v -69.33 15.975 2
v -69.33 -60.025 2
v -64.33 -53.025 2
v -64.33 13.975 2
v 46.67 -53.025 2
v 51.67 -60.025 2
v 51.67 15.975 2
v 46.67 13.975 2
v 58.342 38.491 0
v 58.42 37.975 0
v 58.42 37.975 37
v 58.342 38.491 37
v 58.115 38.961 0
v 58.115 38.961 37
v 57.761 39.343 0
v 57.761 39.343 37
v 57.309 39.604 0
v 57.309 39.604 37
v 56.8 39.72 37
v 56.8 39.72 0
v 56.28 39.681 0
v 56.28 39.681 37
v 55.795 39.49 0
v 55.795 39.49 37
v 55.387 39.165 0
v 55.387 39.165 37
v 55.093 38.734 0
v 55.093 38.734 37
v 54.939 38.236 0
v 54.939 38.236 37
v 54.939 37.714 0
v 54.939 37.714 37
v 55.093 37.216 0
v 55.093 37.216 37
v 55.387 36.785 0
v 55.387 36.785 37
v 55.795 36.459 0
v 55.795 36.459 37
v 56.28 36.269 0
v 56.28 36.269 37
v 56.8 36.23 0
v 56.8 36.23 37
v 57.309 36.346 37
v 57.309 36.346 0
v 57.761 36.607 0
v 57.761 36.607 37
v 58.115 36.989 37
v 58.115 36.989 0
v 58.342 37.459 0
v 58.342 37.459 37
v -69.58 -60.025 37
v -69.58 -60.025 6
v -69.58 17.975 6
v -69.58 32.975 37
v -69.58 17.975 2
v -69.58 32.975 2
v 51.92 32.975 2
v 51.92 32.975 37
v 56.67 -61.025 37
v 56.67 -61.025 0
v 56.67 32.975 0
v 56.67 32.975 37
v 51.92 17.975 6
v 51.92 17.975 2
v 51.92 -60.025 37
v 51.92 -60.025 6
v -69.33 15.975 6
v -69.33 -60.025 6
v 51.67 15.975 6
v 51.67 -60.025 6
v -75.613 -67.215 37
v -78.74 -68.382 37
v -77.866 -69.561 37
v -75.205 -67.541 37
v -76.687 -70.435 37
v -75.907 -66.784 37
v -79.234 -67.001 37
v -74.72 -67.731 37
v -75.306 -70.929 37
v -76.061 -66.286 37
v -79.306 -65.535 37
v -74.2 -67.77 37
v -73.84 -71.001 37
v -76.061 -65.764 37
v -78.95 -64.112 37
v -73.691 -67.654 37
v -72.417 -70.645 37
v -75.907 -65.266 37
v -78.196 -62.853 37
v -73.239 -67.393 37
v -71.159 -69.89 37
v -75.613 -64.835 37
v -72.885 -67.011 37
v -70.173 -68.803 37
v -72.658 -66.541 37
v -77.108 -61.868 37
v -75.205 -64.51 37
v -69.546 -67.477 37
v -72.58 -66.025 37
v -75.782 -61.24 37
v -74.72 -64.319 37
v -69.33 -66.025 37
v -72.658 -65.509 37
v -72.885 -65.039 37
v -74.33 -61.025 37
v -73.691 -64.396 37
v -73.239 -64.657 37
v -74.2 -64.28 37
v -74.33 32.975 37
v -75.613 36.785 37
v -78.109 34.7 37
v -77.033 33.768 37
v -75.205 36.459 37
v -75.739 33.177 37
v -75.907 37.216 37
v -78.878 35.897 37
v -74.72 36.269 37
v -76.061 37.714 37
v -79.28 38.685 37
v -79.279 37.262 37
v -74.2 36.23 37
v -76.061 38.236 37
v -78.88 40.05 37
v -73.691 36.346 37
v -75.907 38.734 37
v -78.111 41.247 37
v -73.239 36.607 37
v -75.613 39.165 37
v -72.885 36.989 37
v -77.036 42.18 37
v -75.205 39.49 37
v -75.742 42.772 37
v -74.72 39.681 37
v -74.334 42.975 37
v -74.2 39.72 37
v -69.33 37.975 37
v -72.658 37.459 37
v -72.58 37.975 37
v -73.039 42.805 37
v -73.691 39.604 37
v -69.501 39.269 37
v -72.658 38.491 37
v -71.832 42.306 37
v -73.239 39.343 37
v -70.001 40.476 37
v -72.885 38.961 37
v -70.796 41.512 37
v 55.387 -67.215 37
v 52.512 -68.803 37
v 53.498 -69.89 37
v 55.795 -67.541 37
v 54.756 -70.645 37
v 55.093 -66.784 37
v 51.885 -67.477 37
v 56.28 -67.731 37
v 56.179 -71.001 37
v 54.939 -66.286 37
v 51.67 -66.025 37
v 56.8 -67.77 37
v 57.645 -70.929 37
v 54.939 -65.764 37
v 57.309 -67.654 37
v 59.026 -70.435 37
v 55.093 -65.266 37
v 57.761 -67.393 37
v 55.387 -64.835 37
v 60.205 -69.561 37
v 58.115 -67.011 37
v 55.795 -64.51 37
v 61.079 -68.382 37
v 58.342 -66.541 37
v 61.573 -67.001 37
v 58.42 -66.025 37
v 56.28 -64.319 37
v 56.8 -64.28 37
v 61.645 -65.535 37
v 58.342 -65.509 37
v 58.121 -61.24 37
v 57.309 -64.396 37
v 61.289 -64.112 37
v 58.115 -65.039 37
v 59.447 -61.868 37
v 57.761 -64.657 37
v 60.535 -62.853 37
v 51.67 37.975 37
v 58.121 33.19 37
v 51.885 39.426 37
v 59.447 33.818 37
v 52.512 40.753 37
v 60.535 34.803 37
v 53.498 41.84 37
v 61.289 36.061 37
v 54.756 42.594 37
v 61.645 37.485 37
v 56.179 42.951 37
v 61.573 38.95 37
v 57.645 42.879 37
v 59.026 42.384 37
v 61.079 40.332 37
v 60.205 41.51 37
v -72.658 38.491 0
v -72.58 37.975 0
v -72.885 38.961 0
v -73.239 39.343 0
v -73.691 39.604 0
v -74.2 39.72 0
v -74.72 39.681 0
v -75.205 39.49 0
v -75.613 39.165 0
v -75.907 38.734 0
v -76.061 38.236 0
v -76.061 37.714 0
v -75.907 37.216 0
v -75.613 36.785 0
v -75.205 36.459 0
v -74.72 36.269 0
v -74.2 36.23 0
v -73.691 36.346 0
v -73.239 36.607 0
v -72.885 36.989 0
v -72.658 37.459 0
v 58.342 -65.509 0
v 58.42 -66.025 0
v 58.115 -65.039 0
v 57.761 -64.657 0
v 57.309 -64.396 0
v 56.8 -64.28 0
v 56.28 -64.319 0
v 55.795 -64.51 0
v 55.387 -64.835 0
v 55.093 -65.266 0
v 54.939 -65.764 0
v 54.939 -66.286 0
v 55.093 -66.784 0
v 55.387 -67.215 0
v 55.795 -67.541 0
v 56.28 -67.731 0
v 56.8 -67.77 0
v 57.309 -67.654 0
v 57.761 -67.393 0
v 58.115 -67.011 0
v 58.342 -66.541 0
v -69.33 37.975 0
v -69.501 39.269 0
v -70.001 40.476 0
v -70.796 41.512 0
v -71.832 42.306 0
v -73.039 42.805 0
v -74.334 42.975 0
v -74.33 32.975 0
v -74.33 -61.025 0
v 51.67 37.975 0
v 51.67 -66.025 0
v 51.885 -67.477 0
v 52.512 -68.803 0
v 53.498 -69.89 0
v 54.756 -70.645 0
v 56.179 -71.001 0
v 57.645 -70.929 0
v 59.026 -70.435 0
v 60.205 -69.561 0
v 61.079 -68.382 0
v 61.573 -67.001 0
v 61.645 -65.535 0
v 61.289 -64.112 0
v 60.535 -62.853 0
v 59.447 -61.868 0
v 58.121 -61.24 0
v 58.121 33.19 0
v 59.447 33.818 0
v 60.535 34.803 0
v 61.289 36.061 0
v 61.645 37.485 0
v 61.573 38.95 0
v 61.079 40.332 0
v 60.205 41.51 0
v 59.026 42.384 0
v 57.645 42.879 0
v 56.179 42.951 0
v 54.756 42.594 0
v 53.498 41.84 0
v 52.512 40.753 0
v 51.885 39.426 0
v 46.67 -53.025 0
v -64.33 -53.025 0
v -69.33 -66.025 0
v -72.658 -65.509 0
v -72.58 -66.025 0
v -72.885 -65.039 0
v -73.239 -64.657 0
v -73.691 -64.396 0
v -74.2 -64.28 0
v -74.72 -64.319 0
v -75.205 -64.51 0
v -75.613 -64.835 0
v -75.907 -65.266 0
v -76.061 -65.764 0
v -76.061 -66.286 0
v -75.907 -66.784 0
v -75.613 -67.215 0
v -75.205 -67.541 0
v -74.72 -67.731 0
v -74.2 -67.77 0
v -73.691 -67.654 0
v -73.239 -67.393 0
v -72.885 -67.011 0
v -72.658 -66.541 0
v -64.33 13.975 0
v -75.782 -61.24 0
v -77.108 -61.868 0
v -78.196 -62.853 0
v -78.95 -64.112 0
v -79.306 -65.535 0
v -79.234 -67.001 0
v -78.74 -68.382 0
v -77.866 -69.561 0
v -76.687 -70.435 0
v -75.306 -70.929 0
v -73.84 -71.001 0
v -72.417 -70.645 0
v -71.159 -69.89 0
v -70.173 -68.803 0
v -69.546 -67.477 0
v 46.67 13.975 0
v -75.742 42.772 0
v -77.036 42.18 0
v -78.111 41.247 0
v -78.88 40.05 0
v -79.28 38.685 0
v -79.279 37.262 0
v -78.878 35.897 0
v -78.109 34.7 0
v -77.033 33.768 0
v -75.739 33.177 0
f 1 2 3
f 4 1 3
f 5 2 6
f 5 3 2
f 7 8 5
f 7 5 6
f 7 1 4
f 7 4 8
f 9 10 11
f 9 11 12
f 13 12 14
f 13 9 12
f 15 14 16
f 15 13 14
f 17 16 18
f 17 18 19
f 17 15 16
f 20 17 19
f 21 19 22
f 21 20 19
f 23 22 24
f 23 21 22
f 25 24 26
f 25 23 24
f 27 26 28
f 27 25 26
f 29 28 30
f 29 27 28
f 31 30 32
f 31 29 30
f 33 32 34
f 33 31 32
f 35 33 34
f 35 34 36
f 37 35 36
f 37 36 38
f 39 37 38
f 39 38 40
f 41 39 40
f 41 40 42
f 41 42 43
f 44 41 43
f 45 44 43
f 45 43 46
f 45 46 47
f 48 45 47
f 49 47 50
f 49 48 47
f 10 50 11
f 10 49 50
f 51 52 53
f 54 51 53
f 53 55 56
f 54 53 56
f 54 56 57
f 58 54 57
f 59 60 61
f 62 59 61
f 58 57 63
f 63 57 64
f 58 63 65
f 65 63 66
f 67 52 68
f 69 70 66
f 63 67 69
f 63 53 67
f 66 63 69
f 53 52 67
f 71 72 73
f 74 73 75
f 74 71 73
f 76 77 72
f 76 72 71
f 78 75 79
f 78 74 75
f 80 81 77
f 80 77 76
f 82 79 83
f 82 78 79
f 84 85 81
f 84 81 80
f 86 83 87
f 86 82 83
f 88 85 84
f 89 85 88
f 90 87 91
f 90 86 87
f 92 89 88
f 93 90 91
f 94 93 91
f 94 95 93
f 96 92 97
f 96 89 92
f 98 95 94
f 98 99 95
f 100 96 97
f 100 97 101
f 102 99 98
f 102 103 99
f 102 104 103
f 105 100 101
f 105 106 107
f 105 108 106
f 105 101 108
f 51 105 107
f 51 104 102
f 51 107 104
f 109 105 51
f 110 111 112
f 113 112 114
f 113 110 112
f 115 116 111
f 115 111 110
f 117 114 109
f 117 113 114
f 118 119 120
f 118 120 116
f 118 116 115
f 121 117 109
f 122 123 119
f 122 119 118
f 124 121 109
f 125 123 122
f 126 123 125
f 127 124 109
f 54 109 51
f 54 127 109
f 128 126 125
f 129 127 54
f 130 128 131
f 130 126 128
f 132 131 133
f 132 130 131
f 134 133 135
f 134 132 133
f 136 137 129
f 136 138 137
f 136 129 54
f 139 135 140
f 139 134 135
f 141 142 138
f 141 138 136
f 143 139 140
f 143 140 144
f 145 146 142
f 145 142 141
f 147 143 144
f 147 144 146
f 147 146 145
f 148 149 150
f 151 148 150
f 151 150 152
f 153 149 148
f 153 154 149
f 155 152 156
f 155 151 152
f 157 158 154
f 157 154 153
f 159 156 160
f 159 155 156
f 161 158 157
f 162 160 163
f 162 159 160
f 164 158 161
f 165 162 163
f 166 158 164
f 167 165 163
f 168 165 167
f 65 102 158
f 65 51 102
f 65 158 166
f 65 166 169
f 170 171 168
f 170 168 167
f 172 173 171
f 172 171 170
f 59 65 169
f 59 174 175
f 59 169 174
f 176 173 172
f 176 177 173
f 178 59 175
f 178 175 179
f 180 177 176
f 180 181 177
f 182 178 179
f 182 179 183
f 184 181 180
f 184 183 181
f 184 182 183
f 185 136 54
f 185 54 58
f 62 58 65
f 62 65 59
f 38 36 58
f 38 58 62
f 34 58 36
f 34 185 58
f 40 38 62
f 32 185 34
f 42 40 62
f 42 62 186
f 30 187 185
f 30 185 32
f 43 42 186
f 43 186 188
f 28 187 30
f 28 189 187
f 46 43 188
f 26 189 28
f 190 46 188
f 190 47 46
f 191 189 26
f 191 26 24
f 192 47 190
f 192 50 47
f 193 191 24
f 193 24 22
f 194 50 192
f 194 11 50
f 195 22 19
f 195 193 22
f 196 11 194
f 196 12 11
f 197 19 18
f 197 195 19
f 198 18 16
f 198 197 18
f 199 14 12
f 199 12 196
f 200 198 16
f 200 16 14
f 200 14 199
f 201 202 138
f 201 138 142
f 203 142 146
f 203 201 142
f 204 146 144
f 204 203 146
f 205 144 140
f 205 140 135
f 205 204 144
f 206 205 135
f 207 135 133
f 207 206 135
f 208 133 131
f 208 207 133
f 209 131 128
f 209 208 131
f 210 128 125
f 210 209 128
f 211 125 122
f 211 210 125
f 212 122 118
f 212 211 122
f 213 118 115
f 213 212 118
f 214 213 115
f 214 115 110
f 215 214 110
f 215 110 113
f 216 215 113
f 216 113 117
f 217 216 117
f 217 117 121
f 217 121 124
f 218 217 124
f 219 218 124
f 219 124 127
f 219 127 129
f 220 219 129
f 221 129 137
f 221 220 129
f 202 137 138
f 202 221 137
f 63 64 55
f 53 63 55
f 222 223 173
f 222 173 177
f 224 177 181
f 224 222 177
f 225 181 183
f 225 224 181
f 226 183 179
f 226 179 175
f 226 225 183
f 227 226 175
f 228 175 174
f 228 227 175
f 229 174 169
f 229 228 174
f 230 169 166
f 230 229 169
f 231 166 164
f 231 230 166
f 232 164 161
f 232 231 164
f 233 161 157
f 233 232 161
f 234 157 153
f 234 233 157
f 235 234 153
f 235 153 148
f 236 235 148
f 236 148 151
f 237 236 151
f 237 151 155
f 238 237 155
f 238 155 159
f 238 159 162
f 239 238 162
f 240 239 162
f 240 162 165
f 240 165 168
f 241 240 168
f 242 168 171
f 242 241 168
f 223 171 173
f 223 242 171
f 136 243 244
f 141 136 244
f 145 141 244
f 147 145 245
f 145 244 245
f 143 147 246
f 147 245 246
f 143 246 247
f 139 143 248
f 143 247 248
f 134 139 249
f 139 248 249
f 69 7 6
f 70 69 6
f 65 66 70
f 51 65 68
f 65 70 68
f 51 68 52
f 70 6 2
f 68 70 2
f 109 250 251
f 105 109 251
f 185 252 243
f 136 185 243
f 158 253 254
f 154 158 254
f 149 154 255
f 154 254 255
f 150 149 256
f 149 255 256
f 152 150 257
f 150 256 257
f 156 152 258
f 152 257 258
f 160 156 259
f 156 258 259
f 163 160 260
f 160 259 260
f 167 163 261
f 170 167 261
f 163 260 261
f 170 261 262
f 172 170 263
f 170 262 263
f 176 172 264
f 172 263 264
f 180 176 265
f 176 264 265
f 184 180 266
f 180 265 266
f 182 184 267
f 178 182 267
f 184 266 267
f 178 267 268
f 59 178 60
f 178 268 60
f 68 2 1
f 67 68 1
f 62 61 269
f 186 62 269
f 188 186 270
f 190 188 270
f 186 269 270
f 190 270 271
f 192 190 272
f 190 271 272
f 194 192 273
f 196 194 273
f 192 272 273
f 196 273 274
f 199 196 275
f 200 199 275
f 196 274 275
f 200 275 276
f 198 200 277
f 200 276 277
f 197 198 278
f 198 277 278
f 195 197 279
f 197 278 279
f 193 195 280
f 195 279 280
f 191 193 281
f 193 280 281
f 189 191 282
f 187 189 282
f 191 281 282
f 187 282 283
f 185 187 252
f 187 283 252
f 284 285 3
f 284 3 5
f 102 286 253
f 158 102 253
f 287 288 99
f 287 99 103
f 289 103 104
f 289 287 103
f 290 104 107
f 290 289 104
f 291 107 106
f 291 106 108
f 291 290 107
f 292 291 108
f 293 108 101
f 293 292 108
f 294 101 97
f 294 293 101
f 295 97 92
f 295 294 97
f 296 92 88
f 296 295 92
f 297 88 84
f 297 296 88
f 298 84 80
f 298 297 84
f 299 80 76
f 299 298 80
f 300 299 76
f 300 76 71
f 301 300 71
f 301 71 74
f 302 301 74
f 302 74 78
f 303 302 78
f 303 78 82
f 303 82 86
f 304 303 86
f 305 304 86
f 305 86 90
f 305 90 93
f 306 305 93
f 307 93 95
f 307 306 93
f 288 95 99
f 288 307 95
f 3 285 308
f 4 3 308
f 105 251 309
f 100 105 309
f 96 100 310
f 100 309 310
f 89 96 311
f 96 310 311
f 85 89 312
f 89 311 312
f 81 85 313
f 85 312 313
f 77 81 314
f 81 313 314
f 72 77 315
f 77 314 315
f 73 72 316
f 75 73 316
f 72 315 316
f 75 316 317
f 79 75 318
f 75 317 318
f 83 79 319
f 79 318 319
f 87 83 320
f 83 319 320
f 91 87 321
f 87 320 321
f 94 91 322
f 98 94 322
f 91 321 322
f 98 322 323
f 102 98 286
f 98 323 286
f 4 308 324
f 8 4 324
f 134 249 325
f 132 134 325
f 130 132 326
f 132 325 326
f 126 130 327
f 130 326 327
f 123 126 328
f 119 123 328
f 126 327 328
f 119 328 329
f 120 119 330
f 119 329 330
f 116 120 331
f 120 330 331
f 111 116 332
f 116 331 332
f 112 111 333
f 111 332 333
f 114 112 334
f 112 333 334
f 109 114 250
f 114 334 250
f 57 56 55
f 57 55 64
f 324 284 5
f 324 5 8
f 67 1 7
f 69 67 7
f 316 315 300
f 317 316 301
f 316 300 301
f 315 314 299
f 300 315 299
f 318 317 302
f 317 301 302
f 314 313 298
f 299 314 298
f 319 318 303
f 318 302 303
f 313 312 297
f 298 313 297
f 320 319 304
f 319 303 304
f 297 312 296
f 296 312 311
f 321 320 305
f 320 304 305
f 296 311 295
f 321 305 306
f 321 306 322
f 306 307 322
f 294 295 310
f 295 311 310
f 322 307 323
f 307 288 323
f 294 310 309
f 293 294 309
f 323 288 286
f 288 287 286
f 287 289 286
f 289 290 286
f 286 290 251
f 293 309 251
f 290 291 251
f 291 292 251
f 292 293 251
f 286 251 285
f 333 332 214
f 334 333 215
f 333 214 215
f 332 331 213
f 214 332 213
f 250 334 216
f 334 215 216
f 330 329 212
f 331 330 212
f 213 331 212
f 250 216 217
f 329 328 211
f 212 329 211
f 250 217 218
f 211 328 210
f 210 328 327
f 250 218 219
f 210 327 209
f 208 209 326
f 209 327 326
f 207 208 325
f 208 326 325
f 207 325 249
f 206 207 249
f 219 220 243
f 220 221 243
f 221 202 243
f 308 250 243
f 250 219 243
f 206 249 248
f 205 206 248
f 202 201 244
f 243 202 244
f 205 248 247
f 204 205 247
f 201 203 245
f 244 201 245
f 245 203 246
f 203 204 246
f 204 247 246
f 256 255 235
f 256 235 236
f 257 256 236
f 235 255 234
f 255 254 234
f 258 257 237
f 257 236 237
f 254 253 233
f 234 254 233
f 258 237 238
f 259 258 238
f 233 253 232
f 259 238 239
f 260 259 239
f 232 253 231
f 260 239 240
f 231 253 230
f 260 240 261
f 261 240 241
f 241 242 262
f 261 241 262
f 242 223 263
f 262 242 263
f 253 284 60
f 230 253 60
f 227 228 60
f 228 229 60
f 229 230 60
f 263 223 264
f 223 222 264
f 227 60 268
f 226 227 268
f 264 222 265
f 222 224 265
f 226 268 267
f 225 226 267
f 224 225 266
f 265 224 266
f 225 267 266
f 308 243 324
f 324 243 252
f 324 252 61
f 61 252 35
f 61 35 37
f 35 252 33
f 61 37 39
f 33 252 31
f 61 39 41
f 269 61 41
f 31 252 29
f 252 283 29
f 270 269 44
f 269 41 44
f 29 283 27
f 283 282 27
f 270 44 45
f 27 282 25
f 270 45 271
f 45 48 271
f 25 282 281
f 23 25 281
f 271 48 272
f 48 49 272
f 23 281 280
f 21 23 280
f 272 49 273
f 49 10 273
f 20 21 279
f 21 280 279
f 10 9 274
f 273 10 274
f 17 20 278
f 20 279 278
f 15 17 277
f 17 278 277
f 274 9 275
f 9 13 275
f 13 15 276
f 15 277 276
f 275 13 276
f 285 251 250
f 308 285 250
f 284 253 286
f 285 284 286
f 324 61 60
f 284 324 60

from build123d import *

# Parameters (mm, degrees)
F0_W     = 121
F0_H     = 76
F0_W_2   = 111
F0_H_2   = 67
F1_DEPTH = 2
F2_DEPTH = 6
F0_W_3   = 121.5
F0_H_3   = 15
F3_DEPTH = 2
F0_R     = 1.75
F4_DEPTH = 37


with BuildPart() as f1:
    # F0 (on Top) → F1 (new body)
    with BuildSketch(Plane.XY):
        with Locations((-8.830484, -22.025124)):
            Rectangle(F0_W, F0_H)
        with Locations((-8.830484, -19.525124)):
            Rectangle(F0_W_2, F0_H_2, mode=Mode.SUBTRACT)
    extrude(amount=F1_DEPTH)

    # F0 (on Top) → F2 (join)
    with BuildSketch(Plane.XY):
        Polygon((-69.580484, -60.025124), (-69.330484, -60.025124), (-69.330484, 15.974876), (51.669516, 15.974876), (51.669516, -60.025124), (51.919516, -60.025124), (51.919516, 17.974876), (-69.580484, 17.974876), align=None)
    extrude(amount=F2_DEPTH)

    # F0 (on Top) → F3 (join)
    with BuildSketch(Plane.XY):
        with Locations((-8.830484, 25.474876)):
            Rectangle(F0_W_3, F0_H_3)
    extrude(amount=F3_DEPTH)

    # F0 (on Top) → F4 (join)
    with BuildSketch(Plane.XY):
        with BuildLine():
            Line((-74.330484, 32.974876), (-69.580484, 32.974876))
            Line((-69.580484, 32.974876), (51.919516, 32.974876))
            Line((51.919516, 32.974876), (56.669516, 32.974876))
            ThreePointArc((56.669516, 32.974876), (60.20505, 41.51041), (51.669516, 37.974876))
            Line((51.669516, 37.974876), (-69.330484, 37.974876))
            ThreePointArc((-69.330484, 37.974876), (-70.796105, 41.511565), (-74.333752, 42.974875))
            ThreePointArc((-74.333752, 42.974875), (-79.330483, 37.973242), (-74.330484, 32.974876))
        make_face()
        with Locations((-74.330484, 37.974876)):
            Circle(F0_R, mode=Mode.SUBTRACT)
        with Locations((56.669516, 37.974876)):
            Circle(F0_R, mode=Mode.SUBTRACT)
        with BuildLine():
            Line((51.669516, -60.025124), (-69.330484, -60.025124))
            Line((-69.330484, -60.025124), (-69.580484, -60.025124))
            Line((-69.580484, -60.025124), (-69.580484, 17.974876))
            Line((-69.580484, 17.974876), (-69.580484, 32.974876))
            Line((-69.580484, 32.974876), (-74.330484, 32.974876))
            Line((-74.330484, 32.974876), (-74.330484, -61.025124))
            ThreePointArc((-74.330484, -61.025124), (-77.866018, -69.560658), (-69.330484, -66.025124))
            Line((-69.330484, -66.025124), (51.669516, -66.025124))
            ThreePointArc((51.669516, -66.025124), (60.20505, -69.560658), (56.669516, -61.025124))
            Line((56.669516, -61.025124), (56.669516, 32.974876))
            Line((56.669516, 32.974876), (51.919516, 32.974876))
            Line((51.919516, 32.974876), (51.919516, 17.974876))
            Line((51.919516, 17.974876), (51.919516, -60.025124))
            Line((51.919516, -60.025124), (51.669516, -60.025124))
        make_face()
        with Locations((-74.330484, -66.025124)):
            Circle(F0_R, mode=Mode.SUBTRACT)
        with Locations((56.669516, -66.025124)):
            Circle(F0_R, mode=Mode.SUBTRACT)
    extrude(amount=F4_DEPTH)


solid = f1.part
